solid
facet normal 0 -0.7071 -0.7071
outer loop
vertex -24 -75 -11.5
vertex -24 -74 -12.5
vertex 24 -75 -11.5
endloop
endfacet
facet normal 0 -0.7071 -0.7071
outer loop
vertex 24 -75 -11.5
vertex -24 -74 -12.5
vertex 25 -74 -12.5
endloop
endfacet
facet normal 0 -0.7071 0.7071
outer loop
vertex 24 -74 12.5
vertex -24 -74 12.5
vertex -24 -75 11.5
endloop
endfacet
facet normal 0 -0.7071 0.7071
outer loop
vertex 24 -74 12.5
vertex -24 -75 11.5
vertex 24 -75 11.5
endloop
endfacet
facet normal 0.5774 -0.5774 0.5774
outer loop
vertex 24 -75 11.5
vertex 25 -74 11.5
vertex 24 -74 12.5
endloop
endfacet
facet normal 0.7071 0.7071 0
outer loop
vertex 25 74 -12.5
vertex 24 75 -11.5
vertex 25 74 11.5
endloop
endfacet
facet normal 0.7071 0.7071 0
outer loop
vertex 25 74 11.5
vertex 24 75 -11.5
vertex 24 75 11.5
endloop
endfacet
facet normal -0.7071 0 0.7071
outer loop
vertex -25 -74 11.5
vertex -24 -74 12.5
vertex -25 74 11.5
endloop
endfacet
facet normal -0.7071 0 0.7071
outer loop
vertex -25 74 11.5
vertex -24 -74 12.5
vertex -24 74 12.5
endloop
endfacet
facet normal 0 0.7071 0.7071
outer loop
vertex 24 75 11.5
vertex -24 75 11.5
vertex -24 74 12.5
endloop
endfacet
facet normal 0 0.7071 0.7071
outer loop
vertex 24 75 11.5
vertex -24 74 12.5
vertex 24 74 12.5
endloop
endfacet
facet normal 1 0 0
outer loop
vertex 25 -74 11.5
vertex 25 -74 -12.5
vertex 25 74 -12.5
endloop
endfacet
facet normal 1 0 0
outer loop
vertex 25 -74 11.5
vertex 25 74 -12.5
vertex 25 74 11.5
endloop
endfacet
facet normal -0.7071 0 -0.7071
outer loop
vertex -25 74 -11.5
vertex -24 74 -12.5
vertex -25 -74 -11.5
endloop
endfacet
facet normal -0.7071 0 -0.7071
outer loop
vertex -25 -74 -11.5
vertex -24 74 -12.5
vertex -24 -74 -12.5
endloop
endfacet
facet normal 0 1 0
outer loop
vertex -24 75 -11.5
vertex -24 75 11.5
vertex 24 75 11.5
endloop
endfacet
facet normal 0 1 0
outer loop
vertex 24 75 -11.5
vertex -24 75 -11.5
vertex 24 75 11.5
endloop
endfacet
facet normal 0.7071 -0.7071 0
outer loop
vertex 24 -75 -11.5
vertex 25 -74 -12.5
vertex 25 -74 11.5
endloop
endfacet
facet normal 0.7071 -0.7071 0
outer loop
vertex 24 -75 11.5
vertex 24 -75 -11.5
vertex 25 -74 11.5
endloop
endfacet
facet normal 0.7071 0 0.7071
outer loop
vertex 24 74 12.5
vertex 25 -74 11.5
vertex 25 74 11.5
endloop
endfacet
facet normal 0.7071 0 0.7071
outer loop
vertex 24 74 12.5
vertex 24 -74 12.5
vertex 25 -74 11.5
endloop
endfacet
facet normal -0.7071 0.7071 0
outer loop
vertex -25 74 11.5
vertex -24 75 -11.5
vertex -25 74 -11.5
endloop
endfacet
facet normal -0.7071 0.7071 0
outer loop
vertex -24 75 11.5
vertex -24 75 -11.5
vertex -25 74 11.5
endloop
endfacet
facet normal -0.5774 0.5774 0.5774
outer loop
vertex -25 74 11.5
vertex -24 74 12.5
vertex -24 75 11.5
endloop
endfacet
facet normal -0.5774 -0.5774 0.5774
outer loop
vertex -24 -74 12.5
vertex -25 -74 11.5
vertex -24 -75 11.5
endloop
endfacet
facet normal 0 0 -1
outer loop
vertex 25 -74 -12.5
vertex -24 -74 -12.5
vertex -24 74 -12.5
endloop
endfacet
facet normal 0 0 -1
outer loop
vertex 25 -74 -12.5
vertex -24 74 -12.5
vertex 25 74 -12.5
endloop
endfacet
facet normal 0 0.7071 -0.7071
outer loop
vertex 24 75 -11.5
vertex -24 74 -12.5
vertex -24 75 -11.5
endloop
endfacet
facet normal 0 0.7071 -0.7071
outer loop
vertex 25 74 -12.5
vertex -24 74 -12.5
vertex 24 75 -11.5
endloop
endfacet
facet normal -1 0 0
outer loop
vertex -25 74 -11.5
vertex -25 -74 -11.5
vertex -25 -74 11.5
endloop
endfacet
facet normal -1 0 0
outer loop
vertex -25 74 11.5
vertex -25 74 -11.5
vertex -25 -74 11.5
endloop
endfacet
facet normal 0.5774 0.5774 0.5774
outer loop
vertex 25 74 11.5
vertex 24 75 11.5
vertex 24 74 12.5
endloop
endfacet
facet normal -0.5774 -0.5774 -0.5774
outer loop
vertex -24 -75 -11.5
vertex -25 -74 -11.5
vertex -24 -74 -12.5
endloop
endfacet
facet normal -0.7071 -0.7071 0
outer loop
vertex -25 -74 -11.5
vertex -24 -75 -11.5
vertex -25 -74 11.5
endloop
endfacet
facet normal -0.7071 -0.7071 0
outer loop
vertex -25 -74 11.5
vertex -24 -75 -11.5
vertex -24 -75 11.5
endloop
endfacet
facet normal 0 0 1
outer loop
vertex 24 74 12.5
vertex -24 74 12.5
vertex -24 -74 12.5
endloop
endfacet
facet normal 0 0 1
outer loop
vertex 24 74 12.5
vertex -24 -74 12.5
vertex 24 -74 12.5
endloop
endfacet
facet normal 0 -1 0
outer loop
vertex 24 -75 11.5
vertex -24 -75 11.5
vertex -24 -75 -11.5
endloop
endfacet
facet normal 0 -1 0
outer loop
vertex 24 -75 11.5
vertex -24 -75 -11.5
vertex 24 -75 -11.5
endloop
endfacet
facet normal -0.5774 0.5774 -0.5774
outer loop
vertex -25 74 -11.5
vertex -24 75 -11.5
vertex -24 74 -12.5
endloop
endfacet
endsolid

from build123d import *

# Parameters (mm, degrees)
F0_W     = 50
F0_H     = 25
F1_DEPTH = 75
F2_SIZE  = 1


with BuildPart() as f1:
    # F0 (on Front) → F1 (new body, symmetric)
    with BuildSketch(Plane.XZ):
        Rectangle(F0_W, F0_H)
    extrude(amount=F1_DEPTH, both=True)

    # F2
    f2_edges = [f1.edges().sort_by_distance(p)[0] for p in [
        (-25, 0, 12.5),
        (0, 75, 12.5),
        (25, 75, 0),
        (0, 75, -12.5),
        (-25, 75, 0),
        (-25, 0, -12.5),
        (25, 0, 12.5),
        (-25, -75, 0),
        (25, -75, 0),
        (0, -75, -12.5),
        (0, -75, 12.5),
    ]]
    chamfer(f2_edges, length=F2_SIZE)


solid = f1.part
